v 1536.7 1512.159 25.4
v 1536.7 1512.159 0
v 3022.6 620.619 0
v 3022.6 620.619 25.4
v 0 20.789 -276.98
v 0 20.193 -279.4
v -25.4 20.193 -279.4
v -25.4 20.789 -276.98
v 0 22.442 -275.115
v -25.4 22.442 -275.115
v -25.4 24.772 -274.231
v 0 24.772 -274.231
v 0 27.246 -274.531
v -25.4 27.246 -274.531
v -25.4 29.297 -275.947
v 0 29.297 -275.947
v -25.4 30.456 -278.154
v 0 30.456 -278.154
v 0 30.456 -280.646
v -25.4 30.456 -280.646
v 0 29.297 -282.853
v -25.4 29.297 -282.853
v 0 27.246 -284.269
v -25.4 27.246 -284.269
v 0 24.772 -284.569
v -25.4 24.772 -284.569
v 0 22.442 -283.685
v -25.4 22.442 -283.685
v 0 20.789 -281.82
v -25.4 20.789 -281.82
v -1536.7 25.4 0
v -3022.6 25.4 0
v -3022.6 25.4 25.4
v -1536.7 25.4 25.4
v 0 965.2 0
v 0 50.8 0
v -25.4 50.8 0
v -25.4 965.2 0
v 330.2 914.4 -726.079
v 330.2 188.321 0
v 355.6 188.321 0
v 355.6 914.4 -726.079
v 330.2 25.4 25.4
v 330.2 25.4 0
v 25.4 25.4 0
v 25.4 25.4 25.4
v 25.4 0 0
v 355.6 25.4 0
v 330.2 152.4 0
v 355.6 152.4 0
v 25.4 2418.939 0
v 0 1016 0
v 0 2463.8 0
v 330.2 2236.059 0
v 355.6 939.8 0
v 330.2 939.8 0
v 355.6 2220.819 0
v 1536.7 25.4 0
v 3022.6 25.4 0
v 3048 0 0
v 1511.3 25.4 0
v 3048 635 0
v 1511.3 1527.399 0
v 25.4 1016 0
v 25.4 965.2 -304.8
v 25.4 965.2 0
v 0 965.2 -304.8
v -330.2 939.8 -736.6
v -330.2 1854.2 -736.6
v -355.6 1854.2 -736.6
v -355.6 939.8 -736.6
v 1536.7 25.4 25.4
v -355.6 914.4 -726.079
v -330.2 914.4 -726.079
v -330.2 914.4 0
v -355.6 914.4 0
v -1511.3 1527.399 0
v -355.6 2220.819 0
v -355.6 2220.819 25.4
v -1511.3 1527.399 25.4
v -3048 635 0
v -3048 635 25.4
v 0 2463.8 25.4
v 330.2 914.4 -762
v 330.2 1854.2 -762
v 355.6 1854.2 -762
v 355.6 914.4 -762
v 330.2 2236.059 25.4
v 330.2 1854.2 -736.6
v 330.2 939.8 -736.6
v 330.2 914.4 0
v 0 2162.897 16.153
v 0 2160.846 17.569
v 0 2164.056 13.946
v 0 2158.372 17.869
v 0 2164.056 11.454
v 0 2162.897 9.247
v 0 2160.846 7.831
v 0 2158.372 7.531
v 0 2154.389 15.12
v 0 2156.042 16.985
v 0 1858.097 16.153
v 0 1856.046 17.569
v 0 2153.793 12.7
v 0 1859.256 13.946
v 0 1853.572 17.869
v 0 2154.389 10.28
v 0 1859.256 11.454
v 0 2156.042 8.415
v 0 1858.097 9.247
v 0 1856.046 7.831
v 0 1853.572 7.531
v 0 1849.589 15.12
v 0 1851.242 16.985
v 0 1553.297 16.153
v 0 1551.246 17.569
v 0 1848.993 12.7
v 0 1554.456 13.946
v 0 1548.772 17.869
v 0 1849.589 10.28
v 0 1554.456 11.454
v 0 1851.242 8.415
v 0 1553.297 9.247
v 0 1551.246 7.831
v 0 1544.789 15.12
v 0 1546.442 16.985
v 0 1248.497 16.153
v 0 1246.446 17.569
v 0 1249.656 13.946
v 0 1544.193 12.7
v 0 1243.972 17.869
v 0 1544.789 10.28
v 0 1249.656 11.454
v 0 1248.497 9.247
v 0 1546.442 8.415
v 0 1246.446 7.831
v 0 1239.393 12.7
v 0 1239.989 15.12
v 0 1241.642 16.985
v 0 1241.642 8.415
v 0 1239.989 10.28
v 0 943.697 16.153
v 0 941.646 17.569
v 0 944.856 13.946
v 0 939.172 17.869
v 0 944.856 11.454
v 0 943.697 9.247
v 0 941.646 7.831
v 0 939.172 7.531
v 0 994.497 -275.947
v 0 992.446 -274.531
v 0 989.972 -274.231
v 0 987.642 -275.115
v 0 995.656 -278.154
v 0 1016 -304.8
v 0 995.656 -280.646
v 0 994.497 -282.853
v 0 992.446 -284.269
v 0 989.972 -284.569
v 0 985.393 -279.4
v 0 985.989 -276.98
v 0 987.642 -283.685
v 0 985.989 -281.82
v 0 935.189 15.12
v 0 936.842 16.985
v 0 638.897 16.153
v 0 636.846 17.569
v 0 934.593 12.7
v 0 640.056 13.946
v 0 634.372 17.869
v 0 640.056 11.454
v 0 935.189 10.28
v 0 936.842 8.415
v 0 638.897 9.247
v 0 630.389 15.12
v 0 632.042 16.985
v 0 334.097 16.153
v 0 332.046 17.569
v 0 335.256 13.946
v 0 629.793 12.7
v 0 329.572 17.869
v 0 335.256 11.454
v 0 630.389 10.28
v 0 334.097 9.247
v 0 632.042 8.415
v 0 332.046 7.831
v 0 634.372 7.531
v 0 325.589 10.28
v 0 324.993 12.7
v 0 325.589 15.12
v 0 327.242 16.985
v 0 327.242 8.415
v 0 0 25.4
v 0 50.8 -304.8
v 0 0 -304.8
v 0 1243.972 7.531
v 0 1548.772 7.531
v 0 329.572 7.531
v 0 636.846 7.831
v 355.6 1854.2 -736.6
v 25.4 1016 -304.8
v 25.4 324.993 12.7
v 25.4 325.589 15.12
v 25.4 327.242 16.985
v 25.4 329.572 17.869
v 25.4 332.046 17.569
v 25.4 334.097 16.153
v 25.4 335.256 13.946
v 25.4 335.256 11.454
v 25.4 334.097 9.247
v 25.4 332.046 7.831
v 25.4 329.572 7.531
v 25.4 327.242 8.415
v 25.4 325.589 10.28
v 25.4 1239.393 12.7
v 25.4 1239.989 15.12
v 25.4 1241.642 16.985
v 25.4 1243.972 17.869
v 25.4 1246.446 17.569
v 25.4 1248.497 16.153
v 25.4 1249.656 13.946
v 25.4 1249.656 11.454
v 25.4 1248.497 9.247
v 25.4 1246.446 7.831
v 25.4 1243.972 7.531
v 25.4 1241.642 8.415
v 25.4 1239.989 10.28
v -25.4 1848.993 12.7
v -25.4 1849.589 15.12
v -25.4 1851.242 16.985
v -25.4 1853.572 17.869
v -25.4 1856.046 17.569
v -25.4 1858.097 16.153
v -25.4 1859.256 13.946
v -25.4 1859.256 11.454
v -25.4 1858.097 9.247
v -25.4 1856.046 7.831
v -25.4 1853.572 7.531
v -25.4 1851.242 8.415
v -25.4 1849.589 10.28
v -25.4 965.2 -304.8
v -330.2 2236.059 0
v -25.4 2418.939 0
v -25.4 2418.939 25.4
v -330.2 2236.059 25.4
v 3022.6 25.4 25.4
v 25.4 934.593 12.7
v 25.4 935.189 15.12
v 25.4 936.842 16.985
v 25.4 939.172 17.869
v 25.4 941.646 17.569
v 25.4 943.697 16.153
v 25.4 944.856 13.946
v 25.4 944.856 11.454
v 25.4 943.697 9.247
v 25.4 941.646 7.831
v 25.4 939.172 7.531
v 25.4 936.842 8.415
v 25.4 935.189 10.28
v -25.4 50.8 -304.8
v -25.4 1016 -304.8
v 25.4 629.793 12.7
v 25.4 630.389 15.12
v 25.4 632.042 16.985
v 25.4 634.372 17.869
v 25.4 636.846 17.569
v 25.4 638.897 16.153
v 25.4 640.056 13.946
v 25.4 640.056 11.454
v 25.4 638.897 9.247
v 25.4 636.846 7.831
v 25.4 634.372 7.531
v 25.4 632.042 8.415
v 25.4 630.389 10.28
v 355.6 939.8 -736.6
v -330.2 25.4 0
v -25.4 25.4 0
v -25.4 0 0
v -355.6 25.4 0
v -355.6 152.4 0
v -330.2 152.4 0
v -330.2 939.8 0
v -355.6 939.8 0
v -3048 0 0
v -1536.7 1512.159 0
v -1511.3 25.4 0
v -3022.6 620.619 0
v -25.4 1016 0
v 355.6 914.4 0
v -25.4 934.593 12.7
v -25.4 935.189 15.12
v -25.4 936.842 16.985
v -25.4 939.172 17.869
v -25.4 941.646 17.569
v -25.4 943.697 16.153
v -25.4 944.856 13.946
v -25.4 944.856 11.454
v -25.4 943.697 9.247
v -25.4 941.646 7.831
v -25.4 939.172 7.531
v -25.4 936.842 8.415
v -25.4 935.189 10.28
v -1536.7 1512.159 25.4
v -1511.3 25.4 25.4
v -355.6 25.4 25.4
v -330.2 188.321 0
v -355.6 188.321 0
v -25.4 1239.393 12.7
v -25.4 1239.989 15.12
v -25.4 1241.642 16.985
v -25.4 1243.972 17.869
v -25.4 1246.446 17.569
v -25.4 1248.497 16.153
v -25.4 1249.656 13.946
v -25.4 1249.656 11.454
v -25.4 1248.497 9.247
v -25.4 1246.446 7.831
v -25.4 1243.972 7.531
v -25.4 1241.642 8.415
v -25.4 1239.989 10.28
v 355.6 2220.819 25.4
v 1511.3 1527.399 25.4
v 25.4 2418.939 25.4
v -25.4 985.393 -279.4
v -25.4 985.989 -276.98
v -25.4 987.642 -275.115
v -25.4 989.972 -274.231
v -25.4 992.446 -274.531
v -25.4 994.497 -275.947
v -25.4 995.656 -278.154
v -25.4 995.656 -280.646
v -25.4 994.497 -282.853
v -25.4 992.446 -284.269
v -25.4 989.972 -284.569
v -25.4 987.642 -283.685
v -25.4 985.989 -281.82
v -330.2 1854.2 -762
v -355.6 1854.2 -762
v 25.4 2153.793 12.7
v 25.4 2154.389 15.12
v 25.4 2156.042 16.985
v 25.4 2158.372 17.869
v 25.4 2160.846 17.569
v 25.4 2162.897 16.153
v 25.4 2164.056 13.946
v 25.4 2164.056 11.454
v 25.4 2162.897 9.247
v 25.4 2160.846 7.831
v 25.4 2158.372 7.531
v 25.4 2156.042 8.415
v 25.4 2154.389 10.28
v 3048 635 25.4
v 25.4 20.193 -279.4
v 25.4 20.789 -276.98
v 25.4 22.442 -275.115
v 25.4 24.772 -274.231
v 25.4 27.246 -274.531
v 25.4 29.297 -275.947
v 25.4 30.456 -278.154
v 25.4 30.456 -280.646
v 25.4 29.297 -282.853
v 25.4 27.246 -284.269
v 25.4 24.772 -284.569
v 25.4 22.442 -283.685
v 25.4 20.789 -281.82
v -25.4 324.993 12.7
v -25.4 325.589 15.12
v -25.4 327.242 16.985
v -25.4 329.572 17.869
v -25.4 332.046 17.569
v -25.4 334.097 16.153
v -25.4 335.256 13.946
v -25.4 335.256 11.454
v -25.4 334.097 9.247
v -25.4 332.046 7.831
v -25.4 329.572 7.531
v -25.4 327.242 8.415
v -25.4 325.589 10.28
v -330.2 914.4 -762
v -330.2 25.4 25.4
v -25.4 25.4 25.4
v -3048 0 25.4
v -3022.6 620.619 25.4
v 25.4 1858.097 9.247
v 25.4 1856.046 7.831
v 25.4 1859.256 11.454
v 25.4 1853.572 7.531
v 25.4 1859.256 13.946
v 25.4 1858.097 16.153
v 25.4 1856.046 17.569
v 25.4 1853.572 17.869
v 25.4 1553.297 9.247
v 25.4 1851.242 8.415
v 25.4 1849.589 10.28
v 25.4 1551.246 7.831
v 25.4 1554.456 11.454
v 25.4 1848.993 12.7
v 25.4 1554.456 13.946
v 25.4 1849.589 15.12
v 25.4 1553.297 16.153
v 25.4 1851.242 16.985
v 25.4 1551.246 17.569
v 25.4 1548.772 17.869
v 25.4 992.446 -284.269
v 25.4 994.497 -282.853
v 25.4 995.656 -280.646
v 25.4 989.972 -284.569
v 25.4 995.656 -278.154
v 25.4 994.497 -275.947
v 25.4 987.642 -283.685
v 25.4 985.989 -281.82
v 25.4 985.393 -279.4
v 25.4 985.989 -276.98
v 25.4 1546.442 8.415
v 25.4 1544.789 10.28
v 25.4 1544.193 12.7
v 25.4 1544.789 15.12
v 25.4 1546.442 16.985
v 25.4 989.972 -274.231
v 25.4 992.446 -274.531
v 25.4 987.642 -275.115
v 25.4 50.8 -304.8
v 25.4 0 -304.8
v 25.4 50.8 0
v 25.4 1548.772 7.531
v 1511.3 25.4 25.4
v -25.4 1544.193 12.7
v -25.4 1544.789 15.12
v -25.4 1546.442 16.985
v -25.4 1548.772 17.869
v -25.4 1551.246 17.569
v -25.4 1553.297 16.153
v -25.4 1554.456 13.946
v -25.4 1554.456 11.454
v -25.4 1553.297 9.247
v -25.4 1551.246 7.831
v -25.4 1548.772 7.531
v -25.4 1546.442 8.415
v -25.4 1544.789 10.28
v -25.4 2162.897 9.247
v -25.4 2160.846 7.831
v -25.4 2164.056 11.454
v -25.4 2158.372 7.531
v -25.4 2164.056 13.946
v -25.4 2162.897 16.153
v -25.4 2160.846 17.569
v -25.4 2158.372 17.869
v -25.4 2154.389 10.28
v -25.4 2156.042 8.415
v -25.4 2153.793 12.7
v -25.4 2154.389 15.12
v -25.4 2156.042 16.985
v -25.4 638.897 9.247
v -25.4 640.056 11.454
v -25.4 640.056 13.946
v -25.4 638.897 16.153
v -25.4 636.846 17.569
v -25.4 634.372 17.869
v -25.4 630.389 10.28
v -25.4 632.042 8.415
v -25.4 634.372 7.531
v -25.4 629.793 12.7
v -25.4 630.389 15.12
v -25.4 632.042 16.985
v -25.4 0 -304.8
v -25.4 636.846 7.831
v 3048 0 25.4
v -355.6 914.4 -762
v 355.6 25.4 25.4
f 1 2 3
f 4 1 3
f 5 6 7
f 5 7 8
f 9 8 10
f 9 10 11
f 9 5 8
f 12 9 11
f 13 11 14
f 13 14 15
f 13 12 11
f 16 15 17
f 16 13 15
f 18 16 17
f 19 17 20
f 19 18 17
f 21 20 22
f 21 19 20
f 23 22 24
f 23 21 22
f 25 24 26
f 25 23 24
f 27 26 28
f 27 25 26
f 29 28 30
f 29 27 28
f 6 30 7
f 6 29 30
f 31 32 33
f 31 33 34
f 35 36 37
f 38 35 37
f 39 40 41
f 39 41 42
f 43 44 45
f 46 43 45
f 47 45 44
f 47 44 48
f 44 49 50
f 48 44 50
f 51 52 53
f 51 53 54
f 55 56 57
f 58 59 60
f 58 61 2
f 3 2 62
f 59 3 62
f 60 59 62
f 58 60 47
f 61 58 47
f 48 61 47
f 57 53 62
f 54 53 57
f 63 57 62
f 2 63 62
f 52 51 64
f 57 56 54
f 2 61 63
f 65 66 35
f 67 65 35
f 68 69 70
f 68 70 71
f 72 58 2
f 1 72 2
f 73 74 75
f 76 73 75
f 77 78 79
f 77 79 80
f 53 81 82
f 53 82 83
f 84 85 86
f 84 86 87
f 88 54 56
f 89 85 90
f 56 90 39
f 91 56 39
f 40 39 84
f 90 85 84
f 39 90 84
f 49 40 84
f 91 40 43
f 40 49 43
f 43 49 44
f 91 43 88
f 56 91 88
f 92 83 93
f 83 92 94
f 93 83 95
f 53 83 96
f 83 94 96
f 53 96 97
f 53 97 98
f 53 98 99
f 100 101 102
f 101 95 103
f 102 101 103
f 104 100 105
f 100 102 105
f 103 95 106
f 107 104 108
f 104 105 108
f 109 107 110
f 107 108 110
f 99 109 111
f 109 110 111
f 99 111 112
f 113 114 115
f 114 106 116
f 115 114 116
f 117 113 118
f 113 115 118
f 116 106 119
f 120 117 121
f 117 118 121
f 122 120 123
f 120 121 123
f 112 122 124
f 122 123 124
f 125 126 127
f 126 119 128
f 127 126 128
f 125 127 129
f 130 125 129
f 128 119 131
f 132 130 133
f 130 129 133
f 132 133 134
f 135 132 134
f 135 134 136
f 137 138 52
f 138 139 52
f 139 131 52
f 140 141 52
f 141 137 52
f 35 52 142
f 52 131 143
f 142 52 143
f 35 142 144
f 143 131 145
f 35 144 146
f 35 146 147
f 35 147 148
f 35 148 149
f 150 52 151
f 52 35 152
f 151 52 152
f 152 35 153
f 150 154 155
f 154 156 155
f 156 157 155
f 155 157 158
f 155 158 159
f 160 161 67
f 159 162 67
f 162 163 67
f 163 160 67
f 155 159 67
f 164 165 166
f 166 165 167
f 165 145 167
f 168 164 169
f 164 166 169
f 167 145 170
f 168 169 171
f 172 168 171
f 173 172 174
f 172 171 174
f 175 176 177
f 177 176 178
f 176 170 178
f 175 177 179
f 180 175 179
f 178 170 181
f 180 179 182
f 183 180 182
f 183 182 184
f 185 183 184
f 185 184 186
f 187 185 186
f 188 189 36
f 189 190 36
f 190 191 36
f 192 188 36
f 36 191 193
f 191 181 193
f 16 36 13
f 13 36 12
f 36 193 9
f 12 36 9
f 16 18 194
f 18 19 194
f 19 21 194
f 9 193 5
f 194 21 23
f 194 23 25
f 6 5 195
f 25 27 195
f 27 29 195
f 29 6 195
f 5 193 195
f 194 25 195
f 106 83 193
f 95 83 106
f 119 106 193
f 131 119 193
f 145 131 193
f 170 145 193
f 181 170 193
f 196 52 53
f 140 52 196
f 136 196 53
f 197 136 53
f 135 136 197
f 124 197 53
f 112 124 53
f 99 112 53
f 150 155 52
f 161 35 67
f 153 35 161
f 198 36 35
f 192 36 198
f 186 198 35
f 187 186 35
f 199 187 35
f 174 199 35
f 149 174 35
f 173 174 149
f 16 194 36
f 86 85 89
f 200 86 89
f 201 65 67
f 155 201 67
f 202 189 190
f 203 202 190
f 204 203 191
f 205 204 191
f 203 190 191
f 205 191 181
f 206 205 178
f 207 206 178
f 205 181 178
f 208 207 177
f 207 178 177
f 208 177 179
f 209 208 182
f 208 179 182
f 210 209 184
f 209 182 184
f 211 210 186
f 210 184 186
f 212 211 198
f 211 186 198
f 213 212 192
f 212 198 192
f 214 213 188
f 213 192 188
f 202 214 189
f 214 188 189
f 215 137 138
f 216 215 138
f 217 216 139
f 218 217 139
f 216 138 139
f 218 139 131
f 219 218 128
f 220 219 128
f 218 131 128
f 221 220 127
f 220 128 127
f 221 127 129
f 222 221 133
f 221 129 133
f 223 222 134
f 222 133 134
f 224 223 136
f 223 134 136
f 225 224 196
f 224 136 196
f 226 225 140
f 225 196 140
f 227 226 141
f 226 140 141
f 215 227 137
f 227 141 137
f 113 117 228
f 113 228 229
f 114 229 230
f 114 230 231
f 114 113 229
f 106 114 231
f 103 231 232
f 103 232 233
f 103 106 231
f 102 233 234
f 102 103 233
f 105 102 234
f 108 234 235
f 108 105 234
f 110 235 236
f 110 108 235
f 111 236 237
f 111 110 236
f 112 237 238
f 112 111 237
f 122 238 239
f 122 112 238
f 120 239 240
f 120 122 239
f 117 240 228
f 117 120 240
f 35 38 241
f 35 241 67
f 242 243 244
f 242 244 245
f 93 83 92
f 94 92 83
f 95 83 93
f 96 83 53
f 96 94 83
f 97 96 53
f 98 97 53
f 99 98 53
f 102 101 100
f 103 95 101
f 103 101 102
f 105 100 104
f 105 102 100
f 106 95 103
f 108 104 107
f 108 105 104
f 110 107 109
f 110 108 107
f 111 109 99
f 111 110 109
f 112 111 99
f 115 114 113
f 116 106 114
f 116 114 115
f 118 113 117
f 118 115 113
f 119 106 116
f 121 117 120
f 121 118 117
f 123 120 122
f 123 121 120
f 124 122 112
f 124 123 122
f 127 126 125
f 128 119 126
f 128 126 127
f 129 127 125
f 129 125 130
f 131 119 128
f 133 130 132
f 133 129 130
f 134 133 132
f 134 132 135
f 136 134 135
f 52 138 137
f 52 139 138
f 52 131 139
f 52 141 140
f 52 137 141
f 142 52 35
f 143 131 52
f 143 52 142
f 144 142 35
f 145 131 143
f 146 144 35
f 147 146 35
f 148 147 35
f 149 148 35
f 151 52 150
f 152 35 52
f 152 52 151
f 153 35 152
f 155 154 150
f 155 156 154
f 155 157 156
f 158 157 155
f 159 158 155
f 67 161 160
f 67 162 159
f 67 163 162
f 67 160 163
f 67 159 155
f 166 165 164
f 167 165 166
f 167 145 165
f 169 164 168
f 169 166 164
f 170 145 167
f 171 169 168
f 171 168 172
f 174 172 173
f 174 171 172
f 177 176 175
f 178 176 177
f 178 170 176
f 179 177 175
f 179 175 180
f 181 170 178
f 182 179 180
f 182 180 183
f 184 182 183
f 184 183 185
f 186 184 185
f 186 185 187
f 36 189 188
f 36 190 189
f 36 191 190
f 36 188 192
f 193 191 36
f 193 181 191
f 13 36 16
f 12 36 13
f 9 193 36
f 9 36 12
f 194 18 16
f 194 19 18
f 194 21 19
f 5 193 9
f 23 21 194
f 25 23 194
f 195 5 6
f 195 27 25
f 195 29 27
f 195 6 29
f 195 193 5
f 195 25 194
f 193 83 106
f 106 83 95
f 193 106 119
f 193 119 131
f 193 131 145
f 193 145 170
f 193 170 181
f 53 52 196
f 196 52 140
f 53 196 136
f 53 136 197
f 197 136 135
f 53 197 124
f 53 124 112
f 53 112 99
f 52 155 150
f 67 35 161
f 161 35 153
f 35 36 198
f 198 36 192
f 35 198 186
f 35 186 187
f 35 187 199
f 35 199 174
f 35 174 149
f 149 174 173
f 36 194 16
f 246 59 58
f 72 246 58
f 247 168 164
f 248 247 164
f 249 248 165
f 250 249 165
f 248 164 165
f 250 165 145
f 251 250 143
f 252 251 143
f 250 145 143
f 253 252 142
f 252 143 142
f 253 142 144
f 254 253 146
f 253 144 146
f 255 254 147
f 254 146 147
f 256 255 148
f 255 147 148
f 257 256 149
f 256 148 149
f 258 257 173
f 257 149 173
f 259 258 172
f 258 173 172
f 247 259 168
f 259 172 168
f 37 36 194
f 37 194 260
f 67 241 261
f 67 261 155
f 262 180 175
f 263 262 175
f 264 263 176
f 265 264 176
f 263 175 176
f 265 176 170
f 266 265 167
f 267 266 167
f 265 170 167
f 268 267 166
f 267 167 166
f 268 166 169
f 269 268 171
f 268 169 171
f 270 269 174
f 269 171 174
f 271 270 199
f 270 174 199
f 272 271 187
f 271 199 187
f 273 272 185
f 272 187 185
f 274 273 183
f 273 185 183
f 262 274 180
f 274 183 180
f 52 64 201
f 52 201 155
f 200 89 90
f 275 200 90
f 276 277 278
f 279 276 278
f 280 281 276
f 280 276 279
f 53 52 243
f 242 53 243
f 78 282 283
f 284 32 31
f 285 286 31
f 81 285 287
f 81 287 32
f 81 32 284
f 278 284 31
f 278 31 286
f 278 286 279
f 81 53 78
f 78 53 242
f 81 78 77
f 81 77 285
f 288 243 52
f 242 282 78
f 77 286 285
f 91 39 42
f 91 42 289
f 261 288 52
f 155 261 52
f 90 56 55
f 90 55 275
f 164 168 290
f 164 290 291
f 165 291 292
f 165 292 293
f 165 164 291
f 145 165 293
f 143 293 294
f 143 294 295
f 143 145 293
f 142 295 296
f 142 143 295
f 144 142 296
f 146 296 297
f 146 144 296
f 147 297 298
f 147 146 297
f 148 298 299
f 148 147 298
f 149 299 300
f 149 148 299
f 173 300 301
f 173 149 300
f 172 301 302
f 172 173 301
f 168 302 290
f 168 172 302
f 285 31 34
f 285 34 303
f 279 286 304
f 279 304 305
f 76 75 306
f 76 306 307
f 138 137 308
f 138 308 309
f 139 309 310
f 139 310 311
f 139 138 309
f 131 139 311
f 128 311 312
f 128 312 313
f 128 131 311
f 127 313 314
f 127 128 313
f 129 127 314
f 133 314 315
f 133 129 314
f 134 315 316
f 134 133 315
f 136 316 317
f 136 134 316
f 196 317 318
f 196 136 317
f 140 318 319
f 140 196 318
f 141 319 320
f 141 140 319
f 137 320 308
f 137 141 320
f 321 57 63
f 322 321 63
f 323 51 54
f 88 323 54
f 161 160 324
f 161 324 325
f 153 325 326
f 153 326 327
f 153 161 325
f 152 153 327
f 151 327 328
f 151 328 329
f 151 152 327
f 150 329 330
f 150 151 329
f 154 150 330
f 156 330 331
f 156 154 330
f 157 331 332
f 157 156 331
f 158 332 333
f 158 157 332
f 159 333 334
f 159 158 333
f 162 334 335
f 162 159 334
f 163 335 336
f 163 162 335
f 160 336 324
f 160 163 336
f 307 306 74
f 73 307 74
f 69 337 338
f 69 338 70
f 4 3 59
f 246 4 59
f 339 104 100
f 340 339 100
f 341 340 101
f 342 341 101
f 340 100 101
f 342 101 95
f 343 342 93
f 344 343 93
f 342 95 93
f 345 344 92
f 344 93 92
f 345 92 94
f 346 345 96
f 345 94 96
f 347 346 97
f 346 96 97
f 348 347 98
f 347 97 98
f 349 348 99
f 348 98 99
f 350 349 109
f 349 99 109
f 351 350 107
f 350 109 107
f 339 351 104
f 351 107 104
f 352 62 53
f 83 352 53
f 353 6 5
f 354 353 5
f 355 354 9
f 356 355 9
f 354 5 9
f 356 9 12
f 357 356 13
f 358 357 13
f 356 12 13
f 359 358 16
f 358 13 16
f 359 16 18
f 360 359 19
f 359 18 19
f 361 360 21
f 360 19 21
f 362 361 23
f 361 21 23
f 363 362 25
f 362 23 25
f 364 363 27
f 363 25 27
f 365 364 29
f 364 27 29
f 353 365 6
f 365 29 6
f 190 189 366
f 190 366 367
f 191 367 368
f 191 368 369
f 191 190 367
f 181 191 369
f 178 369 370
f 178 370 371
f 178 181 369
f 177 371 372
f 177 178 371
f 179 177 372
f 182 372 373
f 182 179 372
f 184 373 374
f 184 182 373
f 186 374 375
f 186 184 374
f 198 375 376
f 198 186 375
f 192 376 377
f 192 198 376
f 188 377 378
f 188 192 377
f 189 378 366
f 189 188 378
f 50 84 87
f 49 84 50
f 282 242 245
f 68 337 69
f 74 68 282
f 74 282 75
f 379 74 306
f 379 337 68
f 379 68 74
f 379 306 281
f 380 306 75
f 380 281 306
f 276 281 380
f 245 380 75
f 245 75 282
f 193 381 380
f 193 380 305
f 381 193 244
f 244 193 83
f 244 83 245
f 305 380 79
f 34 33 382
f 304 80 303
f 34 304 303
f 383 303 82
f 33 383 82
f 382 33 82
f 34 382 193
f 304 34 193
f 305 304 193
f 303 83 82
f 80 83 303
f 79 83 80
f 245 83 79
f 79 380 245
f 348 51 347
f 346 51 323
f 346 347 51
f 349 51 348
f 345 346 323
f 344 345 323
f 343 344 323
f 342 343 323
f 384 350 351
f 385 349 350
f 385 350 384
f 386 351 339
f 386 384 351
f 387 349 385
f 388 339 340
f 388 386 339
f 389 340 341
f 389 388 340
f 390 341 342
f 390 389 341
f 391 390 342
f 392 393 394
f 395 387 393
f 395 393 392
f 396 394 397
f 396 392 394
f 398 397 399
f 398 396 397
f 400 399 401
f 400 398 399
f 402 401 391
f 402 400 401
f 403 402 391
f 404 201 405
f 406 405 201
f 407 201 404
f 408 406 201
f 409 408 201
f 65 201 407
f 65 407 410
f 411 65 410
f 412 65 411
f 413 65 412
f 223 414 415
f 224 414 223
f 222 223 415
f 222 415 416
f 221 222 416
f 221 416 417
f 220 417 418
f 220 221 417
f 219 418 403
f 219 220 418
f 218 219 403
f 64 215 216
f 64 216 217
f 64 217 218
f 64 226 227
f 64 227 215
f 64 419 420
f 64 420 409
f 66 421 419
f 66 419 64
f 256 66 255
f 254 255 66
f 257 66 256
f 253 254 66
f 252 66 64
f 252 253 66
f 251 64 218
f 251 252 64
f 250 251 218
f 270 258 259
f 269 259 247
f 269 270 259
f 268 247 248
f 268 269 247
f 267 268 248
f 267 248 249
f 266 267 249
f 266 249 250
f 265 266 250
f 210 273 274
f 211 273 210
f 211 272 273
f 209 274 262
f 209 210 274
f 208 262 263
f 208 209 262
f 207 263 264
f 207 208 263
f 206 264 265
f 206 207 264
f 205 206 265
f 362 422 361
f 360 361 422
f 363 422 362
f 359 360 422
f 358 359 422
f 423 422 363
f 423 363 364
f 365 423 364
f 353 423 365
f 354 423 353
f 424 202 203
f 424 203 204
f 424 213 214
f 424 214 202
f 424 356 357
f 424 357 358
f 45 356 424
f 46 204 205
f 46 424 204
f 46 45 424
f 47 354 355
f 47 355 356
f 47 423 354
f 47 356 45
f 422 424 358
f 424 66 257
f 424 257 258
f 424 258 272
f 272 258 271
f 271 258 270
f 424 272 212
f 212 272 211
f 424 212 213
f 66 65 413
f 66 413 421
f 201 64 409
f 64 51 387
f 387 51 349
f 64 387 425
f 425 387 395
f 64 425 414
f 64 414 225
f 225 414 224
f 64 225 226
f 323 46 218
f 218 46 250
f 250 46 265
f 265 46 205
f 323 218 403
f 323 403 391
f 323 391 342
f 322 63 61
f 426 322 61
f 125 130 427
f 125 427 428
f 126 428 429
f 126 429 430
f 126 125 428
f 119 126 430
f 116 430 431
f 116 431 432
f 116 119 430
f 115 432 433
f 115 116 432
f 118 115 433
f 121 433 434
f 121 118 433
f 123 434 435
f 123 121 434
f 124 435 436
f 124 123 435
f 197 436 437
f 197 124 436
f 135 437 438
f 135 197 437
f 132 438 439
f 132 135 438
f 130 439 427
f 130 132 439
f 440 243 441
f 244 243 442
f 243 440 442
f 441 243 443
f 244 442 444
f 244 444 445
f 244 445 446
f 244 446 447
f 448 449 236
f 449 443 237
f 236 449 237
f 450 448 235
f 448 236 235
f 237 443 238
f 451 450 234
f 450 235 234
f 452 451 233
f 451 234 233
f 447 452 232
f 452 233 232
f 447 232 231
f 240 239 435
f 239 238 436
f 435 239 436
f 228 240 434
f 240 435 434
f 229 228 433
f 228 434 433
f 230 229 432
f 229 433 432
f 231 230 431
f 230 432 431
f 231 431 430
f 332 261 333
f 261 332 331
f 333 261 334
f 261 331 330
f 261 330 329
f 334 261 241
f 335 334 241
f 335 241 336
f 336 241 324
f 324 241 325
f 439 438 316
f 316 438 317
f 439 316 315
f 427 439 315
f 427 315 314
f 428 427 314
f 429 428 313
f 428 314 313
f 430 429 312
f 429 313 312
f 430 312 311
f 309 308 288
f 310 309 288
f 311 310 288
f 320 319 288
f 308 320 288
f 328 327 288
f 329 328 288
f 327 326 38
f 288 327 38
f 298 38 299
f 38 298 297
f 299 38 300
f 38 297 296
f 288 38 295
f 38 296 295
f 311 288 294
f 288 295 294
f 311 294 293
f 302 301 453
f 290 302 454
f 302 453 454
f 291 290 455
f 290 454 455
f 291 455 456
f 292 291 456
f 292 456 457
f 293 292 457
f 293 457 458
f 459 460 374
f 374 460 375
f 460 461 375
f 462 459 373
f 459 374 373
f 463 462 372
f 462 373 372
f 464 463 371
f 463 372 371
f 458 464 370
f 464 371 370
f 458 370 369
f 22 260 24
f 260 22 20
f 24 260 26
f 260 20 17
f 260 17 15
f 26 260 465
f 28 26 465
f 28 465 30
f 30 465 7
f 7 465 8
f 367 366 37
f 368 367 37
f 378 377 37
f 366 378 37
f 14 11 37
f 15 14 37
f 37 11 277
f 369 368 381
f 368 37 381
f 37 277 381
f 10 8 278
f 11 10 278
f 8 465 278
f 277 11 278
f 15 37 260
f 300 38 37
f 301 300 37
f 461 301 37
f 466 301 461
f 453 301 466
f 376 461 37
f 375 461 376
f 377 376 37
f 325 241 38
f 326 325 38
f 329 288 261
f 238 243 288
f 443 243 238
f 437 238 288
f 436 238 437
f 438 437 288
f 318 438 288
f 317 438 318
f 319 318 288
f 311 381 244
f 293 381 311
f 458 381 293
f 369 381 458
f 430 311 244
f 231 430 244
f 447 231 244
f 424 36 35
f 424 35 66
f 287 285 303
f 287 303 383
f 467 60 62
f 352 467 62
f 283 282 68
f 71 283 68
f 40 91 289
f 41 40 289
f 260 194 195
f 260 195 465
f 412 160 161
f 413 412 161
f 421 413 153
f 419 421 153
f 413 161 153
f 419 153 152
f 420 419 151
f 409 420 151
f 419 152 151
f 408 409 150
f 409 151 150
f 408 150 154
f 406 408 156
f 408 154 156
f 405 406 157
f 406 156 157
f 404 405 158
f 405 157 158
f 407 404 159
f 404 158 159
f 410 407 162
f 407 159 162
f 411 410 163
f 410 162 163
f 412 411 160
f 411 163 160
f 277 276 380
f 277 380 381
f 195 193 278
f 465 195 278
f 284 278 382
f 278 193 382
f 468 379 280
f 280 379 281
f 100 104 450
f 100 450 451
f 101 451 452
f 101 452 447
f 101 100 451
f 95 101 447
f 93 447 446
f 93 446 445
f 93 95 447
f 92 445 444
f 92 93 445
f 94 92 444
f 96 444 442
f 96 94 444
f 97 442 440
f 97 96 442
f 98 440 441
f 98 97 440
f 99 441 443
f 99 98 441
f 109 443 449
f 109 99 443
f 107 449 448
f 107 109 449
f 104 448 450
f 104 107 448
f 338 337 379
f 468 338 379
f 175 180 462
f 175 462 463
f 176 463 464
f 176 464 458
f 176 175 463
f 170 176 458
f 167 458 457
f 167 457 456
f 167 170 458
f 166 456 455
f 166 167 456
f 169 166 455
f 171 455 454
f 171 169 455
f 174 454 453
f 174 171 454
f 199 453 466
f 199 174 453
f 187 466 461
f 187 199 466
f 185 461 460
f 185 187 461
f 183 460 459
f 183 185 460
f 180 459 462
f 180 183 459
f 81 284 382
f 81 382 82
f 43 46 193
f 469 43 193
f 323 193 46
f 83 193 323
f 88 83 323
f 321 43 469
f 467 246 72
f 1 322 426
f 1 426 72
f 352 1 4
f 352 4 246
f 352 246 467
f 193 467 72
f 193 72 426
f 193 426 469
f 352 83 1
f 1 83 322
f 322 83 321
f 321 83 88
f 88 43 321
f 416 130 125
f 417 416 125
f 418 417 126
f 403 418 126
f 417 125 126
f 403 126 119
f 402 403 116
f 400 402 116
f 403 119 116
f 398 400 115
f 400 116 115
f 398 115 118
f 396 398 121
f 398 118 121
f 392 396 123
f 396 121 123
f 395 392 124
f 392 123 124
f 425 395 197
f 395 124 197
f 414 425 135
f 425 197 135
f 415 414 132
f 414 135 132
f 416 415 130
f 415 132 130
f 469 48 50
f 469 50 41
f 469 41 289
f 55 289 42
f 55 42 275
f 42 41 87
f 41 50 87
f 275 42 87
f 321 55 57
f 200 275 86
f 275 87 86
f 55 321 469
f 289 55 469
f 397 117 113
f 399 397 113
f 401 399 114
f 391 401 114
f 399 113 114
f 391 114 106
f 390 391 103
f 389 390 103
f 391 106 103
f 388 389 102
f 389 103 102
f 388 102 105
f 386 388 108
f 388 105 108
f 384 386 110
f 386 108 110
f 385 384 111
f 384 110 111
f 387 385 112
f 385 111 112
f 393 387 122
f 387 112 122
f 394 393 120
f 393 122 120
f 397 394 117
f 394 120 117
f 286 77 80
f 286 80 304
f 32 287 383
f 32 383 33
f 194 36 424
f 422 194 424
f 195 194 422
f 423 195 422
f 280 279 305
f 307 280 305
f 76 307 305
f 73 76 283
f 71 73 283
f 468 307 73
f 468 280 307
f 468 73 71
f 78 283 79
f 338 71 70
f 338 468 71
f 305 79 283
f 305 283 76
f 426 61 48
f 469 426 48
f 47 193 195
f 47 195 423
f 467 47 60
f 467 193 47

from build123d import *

# Parameters (mm, degrees)
F1_DEPTH  = 25.4
F3_DEPTH  = 50.8
F5_W      = 25.4
F5_H      = 304.8
F6_DEPTH  = 50.8
F7_W      = 914.4
F7_H      = 25.4
F8_DEPTH  = 25.4
F9_R      = 5.207
F10_DEPTH = 25.4


with BuildPart() as f1:
    # F0 (on Top) → F1 (new body)
    with BuildSketch(Plane.XY):
        Polygon((0, 2463.8), (0, 25.4), (25.4, 25.4), (25.4, 2418.9387643742), align=None)
        Polygon((3048, 635), (0, 2463.8), (25.4, 2418.9387643742), (330.2, 2236.0587643742), (355.6, 2220.8187643742), (1511.3, 1527.3987643742), (1536.7, 1512.1587643742), (3022.6, 620.6187643742), align=None)
        Polygon((1511.3, 25.4), (1536.7, 25.4), (1536.7, 1512.1587643742), (1511.3, 1527.3987643742), align=None)
        Polygon((3022.6, 25.4), (3048, 25.4), (3048, 635), (3022.6, 620.6187643742), align=None)
        Polygon((0, 25.4), (0, 0), (3048, 0), (3048, 25.4), (3022.6, 25.4), (1536.7, 25.4), (1511.3, 25.4), (355.6, 25.4), (330.2, 25.4), (25.4, 25.4), align=None)
        Polygon((330.2, 2236.0587643742), (330.2, 25.4), (355.6, 25.4), (355.6, 2220.8187643742), align=None)
    extrude(amount=F1_DEPTH)

    # F2 (on face) → F3 (join)
    with BuildSketch(Plane.XZ):
        Polygon((25.4, 0), (0, 0), (0, -304.8), (25.4, -304.8), (25.4, -279.4), (25.4, -243.4789755157), align=None)
    extrude(amount=-F3_DEPTH)

    # F5 (on offset) → F6 (join)
    with BuildSketch(Plane(origin=(0, 965.2, 0), x_dir=(-1, 0, 0), z_dir=(0, 1, 0))):
        with Locations((-12.7, -152.4)):
            Rectangle(F5_W, F5_H)
    extrude(amount=F6_DEPTH)

    # F7 (on face) → F8 (join)
    with BuildSketch(Plane(origin=(330.2, 0, 0), x_dir=(0, -1, 0), z_dir=(-1, 0, 0))):
        Polygon((-914.4, -762), (-152.4, 0), (-188.3210244843, 0), (-914.4, -726.0789755157), align=None)
        Polygon((-939.8, -762), (-914.4, -762), (-914.4, -726.0789755157), (-914.4, 0), (-939.8, 0), (-939.8, -736.6), align=None)
        with Locations((-1397, -749.3)):
            Rectangle(F7_W, F7_H)
    extrude(amount=-F8_DEPTH)

    # F9 (on face) → F10 (cut, through all)
    with BuildSketch(Plane(origin=(0, 0, 0), x_dir=(0, -1, 0), z_dir=(-1, 0, 0))):
        with Locations((-2159, 12.7)):
            Circle(F9_R)
        with Locations((-1854.2, 12.7)):
            Circle(F9_R)
        with Locations((-1549.4, 12.7)):
            Circle(F9_R)
        with Locations((-1244.6, 12.7)):
            Circle(F9_R)
        with Locations((-939.8, 12.7)):
            Circle(F9_R)
        with Locations((-990.6, -279.4)):
            Circle(F9_R)
        with Locations((-635, 12.7)):
            Circle(F9_R)
        with Locations((-330.2, 12.7)):
            Circle(F9_R)
        with Locations((-25.4, -279.4)):
            Circle(F9_R)
    extrude(amount=-F10_DEPTH, mode=Mode.SUBTRACT)


with BuildPart() as f11_1:
    # F11: instance of F1
    add(f1.part.mirror(Plane(origin=(0, 991.5317021022, -41.8690431459), x_dir=(0, -1, 0), z_dir=(-1, 0, 0))))


solid = Compound([f1.part, f11_1.part])
